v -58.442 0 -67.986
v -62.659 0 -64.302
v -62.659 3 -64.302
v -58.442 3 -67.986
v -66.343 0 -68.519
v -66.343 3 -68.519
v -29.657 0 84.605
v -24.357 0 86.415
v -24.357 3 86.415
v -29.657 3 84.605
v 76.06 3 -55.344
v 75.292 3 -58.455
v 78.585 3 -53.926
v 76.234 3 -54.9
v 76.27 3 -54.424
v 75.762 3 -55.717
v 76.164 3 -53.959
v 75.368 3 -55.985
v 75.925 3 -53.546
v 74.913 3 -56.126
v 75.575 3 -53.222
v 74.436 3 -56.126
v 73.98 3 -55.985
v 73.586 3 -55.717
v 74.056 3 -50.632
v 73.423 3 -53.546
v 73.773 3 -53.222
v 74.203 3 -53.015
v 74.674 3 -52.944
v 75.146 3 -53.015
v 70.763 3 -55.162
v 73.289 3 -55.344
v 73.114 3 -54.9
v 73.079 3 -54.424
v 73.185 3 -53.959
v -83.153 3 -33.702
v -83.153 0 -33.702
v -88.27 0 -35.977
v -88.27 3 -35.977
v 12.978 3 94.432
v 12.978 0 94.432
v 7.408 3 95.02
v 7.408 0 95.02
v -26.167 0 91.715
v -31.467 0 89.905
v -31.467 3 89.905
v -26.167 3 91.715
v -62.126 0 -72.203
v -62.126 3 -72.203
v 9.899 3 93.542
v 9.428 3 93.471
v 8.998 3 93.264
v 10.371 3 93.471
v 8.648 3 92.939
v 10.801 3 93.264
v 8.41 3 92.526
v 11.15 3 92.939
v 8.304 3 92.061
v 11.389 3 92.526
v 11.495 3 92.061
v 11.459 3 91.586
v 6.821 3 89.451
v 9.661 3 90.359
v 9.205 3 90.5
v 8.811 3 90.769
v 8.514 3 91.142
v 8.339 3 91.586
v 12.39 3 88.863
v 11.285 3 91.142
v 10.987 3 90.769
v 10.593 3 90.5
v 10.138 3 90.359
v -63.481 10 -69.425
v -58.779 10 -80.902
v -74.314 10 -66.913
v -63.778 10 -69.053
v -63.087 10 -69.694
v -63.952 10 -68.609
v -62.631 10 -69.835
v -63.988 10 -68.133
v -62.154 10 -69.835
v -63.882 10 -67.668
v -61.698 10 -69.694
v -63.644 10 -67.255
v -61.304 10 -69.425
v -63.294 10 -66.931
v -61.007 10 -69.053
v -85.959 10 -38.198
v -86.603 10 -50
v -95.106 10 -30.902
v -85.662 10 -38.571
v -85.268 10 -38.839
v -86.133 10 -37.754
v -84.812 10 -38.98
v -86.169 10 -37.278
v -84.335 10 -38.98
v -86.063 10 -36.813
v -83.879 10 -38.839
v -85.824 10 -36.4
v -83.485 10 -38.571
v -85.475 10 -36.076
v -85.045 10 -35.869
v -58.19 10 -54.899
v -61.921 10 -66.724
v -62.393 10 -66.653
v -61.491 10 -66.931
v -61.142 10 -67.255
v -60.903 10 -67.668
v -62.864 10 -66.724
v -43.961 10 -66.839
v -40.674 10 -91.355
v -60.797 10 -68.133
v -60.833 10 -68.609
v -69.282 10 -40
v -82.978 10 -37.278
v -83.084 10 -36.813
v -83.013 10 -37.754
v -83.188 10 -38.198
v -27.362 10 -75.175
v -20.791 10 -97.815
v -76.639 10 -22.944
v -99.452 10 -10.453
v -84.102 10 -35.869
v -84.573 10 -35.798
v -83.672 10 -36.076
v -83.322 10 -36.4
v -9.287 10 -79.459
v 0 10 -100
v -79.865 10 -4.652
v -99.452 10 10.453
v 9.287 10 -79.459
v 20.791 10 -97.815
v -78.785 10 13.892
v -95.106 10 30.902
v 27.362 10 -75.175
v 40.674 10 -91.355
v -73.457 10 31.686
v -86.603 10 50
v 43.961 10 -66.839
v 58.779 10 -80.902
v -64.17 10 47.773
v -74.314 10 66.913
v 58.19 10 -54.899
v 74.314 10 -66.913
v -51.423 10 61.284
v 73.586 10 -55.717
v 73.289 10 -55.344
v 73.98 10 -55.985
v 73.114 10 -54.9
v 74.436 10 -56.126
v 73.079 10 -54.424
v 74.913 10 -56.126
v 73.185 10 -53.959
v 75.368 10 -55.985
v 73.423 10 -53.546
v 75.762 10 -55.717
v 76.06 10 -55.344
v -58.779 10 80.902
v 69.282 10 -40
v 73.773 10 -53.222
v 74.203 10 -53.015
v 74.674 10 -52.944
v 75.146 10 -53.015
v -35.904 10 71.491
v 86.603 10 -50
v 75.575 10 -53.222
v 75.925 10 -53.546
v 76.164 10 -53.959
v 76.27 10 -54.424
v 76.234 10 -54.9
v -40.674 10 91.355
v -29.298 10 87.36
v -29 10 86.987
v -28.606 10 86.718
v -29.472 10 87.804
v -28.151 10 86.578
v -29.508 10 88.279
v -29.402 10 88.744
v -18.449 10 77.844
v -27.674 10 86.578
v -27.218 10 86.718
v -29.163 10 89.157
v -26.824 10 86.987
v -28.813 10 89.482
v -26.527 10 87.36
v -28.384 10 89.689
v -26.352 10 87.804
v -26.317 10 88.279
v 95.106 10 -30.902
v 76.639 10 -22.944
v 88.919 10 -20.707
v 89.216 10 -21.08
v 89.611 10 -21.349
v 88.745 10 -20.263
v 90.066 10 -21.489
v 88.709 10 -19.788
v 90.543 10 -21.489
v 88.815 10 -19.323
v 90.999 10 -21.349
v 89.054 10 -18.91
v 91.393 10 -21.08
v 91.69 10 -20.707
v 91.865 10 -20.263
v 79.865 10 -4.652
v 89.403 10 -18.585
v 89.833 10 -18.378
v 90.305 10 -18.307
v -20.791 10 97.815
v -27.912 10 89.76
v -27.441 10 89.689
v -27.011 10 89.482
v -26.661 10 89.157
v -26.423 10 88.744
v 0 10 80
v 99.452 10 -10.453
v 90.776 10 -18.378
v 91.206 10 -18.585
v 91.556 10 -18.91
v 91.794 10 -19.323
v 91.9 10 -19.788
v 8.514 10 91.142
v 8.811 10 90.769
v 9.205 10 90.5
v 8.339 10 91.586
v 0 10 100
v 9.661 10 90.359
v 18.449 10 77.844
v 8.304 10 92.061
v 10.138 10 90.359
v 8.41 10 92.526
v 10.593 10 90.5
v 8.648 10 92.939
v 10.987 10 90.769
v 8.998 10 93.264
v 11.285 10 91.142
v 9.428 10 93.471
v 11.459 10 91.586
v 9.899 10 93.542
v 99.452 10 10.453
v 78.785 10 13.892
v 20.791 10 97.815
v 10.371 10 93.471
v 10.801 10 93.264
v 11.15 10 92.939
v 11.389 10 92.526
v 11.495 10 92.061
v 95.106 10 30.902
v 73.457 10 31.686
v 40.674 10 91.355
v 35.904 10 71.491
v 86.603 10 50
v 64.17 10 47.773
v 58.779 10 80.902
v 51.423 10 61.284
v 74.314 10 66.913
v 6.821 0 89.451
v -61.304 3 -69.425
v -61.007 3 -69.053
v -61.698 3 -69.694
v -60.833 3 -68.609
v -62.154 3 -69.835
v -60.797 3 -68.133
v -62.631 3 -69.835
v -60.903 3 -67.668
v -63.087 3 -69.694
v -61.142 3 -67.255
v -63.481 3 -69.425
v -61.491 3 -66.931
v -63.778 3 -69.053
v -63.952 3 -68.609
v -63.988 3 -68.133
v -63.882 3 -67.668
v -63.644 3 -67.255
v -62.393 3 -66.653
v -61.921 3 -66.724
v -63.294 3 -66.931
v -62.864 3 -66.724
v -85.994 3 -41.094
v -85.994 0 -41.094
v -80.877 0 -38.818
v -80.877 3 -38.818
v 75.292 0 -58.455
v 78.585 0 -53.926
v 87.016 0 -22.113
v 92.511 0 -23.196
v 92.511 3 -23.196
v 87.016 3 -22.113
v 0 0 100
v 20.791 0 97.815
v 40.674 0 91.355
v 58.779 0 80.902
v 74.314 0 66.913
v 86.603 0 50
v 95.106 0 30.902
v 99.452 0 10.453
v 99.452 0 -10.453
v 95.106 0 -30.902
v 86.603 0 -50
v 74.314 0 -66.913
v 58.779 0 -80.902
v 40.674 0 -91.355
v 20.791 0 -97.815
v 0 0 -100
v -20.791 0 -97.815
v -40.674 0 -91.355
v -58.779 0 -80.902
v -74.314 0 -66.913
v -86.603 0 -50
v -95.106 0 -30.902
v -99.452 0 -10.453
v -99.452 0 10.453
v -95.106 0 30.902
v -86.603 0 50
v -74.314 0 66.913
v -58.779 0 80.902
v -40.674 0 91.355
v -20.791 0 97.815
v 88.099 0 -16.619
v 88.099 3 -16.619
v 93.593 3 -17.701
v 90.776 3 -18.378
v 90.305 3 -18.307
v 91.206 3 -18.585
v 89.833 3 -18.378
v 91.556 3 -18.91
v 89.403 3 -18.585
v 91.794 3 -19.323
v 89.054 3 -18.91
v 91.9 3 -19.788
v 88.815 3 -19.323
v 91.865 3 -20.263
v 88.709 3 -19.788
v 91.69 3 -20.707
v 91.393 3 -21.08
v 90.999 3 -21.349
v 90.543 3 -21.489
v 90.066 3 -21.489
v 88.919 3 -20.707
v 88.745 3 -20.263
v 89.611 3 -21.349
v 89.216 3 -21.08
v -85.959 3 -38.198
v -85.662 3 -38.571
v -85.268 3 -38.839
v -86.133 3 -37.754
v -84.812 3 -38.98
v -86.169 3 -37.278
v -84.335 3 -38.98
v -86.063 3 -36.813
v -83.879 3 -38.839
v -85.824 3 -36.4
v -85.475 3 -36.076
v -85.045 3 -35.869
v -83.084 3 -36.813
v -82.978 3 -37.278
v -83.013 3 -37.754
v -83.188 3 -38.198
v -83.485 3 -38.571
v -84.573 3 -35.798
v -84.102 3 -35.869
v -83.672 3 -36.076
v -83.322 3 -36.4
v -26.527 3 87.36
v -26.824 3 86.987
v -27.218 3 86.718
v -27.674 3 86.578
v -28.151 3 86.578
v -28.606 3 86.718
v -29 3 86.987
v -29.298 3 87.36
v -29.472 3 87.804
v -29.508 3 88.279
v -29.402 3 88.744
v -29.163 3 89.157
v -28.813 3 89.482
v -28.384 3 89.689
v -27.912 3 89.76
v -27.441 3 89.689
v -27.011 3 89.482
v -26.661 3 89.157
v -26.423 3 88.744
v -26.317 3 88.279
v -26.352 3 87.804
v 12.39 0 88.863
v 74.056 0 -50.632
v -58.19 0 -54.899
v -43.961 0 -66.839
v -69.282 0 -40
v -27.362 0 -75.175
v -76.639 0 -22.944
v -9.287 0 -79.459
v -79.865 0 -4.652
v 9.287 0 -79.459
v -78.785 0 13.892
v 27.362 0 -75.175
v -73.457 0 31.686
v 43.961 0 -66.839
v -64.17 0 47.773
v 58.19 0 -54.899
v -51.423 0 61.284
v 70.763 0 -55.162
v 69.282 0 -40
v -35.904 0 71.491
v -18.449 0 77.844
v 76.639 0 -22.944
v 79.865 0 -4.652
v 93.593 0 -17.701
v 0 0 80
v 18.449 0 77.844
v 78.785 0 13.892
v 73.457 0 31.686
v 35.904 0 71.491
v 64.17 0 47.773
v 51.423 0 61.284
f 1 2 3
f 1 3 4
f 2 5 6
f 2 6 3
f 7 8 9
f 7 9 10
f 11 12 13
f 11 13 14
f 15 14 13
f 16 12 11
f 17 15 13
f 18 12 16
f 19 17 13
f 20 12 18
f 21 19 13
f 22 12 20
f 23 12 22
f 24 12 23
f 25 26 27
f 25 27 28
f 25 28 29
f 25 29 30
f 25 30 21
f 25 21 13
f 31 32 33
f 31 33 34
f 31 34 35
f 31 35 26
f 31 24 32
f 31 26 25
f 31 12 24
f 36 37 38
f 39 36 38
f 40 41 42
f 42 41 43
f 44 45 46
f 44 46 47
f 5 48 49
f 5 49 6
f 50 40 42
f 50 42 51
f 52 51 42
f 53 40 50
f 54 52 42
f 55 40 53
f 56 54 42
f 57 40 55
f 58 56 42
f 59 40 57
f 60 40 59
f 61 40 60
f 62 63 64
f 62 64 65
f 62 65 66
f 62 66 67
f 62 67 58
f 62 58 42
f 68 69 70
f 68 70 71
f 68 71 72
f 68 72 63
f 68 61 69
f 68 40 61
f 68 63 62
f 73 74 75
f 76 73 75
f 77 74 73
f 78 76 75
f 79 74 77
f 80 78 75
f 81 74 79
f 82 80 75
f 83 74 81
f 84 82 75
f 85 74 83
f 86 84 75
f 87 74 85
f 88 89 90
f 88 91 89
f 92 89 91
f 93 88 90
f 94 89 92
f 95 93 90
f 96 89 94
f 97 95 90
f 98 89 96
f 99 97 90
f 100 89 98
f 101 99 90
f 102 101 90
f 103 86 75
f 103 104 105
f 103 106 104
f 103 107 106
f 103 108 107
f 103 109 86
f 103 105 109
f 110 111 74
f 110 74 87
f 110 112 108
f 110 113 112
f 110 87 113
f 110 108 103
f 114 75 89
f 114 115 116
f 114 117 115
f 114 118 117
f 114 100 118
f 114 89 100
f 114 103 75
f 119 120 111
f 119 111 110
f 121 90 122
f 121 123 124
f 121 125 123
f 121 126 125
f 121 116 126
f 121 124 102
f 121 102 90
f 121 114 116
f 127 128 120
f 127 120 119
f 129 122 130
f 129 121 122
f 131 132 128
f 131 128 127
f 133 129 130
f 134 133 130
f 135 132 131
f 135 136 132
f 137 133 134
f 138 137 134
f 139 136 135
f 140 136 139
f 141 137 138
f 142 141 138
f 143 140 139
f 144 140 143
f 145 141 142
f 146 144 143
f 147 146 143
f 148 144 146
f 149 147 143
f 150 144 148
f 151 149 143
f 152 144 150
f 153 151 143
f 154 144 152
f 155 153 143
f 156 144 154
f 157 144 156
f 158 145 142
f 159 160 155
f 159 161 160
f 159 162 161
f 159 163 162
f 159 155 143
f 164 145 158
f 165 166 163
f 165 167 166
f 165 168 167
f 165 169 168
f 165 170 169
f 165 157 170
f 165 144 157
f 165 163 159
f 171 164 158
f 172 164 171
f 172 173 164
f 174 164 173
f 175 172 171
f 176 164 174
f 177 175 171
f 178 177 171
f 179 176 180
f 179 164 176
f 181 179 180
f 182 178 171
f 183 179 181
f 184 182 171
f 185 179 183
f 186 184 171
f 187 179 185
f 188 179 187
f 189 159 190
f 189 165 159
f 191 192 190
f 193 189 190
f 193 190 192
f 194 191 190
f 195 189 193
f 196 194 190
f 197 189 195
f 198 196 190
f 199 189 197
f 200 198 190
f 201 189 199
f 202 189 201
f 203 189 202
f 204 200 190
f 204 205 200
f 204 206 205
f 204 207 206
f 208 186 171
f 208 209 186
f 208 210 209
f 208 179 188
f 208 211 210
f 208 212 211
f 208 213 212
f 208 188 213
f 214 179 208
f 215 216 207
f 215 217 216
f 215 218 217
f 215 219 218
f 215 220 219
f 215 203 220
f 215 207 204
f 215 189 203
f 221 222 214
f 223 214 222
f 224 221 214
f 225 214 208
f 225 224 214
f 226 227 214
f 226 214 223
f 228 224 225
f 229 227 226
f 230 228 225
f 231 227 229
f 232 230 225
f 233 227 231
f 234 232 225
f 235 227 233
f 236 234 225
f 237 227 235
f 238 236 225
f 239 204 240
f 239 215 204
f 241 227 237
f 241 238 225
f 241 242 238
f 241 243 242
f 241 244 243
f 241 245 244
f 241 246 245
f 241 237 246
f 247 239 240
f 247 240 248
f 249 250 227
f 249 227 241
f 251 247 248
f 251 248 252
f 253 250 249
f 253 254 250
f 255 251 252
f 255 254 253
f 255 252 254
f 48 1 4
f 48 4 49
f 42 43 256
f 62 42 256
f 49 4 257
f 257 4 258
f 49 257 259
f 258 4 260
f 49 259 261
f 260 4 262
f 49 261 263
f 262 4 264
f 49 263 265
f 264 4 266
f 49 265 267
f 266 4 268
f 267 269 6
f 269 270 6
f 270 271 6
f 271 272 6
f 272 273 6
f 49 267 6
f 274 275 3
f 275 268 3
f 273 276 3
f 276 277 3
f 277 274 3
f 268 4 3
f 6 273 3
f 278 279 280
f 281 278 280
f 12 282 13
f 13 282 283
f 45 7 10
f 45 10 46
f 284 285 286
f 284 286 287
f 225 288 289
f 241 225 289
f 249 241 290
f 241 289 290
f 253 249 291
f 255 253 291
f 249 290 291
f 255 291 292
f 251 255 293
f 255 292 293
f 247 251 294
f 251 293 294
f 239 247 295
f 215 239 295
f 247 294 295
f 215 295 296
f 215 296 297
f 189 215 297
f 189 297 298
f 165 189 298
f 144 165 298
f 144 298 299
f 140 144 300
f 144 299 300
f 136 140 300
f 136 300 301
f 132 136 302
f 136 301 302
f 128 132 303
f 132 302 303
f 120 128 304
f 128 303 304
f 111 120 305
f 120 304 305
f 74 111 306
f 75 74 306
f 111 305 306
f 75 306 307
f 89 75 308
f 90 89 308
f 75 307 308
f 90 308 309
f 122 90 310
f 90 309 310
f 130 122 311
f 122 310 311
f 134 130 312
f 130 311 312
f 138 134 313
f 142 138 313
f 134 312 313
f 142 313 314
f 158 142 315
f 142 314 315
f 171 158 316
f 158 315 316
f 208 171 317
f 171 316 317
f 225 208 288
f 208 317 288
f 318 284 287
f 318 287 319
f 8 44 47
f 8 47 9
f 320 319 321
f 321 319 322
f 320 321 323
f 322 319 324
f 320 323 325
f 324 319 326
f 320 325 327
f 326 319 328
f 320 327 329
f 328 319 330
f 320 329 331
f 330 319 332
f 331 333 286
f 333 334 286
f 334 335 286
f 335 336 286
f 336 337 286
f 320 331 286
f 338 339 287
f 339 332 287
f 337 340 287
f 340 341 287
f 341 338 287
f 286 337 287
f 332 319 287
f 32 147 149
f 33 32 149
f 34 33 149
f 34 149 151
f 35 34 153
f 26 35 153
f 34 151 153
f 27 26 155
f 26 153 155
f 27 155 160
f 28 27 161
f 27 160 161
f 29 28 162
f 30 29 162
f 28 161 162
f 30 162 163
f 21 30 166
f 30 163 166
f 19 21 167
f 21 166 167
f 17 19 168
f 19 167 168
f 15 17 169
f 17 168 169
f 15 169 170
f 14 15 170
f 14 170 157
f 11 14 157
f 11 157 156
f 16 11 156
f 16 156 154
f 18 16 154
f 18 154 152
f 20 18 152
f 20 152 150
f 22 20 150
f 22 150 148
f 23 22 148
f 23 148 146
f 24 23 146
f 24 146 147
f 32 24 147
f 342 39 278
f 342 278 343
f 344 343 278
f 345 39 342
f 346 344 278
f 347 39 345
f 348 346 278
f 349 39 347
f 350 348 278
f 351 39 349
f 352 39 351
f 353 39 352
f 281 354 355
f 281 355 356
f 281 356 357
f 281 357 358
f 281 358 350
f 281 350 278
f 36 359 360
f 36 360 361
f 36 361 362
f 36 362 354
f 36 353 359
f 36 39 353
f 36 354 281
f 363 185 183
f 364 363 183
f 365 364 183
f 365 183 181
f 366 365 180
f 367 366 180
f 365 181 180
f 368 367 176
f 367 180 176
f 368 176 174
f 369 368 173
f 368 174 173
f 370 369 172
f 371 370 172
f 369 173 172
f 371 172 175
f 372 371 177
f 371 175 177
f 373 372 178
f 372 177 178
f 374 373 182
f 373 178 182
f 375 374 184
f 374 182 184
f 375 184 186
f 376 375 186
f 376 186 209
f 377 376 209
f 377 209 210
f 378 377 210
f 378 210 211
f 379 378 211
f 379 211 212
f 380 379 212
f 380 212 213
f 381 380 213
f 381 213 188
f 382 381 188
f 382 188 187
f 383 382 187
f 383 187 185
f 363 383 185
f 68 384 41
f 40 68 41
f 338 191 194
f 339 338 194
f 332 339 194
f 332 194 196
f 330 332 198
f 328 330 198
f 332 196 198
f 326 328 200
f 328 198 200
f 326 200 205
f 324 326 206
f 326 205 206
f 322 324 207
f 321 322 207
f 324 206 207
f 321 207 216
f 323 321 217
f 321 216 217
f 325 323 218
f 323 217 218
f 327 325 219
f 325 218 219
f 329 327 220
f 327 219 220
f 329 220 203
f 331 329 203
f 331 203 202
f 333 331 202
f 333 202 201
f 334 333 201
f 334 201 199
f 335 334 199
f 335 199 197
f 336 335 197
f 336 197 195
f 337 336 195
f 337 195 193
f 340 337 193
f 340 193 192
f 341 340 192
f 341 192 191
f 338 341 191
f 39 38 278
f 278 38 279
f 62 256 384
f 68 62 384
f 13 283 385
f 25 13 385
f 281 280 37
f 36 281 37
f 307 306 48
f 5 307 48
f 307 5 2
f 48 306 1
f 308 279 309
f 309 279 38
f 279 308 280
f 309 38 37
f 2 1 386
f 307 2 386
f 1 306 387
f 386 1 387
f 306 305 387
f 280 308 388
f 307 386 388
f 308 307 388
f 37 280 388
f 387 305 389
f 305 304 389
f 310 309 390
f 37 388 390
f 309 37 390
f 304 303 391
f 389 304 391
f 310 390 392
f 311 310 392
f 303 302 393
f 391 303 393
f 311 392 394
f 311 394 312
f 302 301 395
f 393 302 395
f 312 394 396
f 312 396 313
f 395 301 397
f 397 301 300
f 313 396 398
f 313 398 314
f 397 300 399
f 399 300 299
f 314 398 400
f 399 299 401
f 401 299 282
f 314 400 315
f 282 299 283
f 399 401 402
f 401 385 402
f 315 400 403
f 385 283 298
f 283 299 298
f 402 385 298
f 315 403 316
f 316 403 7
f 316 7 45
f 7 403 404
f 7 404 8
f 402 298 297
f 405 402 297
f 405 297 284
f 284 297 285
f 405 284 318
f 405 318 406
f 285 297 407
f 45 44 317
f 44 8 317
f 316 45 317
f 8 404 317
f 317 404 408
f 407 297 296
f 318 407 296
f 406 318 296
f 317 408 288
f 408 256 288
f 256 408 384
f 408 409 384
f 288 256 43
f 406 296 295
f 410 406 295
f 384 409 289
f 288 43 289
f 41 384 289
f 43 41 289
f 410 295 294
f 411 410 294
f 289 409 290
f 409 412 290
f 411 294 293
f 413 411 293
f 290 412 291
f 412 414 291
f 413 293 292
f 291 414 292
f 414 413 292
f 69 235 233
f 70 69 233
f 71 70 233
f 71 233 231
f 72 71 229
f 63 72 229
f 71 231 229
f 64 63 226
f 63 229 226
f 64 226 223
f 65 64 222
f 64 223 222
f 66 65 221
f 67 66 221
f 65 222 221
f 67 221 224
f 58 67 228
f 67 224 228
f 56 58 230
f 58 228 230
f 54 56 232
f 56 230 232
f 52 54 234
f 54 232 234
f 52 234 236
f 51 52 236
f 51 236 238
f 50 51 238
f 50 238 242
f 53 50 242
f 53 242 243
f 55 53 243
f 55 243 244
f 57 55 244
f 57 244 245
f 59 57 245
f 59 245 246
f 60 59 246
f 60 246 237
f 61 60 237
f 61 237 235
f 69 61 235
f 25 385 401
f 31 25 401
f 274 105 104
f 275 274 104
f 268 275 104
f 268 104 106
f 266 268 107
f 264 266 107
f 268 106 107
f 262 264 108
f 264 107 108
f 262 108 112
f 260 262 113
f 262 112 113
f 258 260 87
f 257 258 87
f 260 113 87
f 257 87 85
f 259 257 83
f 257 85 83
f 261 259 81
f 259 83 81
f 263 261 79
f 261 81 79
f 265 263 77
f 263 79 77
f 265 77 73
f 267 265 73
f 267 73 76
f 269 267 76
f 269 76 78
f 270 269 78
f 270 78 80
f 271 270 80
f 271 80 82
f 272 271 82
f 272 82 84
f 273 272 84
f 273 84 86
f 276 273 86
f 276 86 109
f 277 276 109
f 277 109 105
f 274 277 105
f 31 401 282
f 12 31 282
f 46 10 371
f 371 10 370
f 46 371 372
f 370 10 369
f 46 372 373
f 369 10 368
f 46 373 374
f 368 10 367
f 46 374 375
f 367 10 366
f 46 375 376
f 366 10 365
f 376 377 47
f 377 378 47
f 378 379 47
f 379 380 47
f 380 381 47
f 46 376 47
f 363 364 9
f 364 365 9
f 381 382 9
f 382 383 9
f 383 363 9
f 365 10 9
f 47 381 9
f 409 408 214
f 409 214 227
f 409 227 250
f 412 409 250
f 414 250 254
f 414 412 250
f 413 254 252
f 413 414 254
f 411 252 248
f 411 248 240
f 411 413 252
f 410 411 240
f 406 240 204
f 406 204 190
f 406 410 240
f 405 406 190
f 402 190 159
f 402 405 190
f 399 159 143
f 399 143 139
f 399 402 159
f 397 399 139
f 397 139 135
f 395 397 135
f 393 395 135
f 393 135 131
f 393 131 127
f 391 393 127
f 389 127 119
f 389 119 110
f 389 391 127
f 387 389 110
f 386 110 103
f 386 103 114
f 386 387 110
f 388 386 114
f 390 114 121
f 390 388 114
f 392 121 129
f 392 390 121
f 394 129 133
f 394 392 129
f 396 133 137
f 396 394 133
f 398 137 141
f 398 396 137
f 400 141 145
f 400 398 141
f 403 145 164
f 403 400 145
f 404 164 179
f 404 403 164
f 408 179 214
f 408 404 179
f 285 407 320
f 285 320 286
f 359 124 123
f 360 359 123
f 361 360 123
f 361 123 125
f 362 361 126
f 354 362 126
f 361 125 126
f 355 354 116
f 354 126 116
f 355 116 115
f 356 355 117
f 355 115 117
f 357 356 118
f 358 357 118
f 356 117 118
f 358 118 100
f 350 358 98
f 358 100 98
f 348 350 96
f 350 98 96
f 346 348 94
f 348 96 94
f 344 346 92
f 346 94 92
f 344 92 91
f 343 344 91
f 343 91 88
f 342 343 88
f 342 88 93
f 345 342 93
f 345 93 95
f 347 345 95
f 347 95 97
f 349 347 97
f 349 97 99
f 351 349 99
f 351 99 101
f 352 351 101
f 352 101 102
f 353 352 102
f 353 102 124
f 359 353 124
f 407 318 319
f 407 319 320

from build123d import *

# Parameters (mm, degrees)
SKETCH_1_R               = 100
SKETCH_1_R_2             = 80
EXTRUDE_1_DEPTH          = 10
SKETCH_3_R               = 1.6
CUT_EXTRUDE_2_DEPTH      = 142.774468788
CUT_EXTRUDE_3_DEPTH      = 3
PATTERN_CIRCULAR_1_COUNT = 3


with BuildPart() as part:
    # 草图1 → 凸台-拉伸1 (new body)
    with BuildSketch(Plane(origin=(0, 0, 0), x_dir=(1, 0, 0), z_dir=(0, 1, 0))):
        with Locations(Location((0, 0, 0), (0, 0, 270))):
            Circle(SKETCH_1_R)
        with Locations(Location((0, 0, 0), (0, 0, 270))):
            Circle(SKETCH_1_R_2, mode=Mode.SUBTRACT)
    extrude(amount=EXTRUDE_1_DEPTH)

    # 草图3 → 切除-拉伸2 (cut, through all)
    with BuildSketch(Plane(origin=(0, 10, 0), x_dir=(1, 0, 0), z_dir=(0, 1, 0))):
        with Locations(Location((-62.39260708, 68.252564653, 0), (0, 0, 270))):
            Circle(SKETCH_3_R)
        with Locations(Location((-84.573353466, 37.397832605, 0), (0, 0, 270))):
            Circle(SKETCH_3_R)
    cut_extrude_2 = extrude(amount=-CUT_EXTRUDE_2_DEPTH, mode=Mode.SUBTRACT)

    # 草图4 → 切除-拉伸3 (cut)
    with BuildSketch(Plane.XZ):
        Polygon((-80.877120495, -38.81834724), (-83.152838831, -33.701599634), (-88.269586436, -35.97731797), (-85.993868101, -41.094065575), align=None)
        Polygon((-62.126188983, -72.20339006), (-66.343432487, -68.51898275), (-62.659025177, -64.301739246), (-58.441781673, -67.986146556), align=None)
    cut_extrude_3 = extrude(amount=-CUT_EXTRUDE_3_DEPTH, mode=Mode.SUBTRACT)

    # 阵列(圆周)1: 切除-拉伸2, 切除-拉伸3 ×3 about axis
    pattern_circular_1_axis = Axis((0, 0, 0), (0, 1, 0))
    add([cut_extrude_2.rotate(pattern_circular_1_axis, i * 360 / PATTERN_CIRCULAR_1_COUNT) for i in range(1, PATTERN_CIRCULAR_1_COUNT)], mode=Mode.SUBTRACT)
    add([cut_extrude_3.rotate(pattern_circular_1_axis, i * 360 / PATTERN_CIRCULAR_1_COUNT) for i in range(1, PATTERN_CIRCULAR_1_COUNT)], mode=Mode.SUBTRACT)


solid = part.part
